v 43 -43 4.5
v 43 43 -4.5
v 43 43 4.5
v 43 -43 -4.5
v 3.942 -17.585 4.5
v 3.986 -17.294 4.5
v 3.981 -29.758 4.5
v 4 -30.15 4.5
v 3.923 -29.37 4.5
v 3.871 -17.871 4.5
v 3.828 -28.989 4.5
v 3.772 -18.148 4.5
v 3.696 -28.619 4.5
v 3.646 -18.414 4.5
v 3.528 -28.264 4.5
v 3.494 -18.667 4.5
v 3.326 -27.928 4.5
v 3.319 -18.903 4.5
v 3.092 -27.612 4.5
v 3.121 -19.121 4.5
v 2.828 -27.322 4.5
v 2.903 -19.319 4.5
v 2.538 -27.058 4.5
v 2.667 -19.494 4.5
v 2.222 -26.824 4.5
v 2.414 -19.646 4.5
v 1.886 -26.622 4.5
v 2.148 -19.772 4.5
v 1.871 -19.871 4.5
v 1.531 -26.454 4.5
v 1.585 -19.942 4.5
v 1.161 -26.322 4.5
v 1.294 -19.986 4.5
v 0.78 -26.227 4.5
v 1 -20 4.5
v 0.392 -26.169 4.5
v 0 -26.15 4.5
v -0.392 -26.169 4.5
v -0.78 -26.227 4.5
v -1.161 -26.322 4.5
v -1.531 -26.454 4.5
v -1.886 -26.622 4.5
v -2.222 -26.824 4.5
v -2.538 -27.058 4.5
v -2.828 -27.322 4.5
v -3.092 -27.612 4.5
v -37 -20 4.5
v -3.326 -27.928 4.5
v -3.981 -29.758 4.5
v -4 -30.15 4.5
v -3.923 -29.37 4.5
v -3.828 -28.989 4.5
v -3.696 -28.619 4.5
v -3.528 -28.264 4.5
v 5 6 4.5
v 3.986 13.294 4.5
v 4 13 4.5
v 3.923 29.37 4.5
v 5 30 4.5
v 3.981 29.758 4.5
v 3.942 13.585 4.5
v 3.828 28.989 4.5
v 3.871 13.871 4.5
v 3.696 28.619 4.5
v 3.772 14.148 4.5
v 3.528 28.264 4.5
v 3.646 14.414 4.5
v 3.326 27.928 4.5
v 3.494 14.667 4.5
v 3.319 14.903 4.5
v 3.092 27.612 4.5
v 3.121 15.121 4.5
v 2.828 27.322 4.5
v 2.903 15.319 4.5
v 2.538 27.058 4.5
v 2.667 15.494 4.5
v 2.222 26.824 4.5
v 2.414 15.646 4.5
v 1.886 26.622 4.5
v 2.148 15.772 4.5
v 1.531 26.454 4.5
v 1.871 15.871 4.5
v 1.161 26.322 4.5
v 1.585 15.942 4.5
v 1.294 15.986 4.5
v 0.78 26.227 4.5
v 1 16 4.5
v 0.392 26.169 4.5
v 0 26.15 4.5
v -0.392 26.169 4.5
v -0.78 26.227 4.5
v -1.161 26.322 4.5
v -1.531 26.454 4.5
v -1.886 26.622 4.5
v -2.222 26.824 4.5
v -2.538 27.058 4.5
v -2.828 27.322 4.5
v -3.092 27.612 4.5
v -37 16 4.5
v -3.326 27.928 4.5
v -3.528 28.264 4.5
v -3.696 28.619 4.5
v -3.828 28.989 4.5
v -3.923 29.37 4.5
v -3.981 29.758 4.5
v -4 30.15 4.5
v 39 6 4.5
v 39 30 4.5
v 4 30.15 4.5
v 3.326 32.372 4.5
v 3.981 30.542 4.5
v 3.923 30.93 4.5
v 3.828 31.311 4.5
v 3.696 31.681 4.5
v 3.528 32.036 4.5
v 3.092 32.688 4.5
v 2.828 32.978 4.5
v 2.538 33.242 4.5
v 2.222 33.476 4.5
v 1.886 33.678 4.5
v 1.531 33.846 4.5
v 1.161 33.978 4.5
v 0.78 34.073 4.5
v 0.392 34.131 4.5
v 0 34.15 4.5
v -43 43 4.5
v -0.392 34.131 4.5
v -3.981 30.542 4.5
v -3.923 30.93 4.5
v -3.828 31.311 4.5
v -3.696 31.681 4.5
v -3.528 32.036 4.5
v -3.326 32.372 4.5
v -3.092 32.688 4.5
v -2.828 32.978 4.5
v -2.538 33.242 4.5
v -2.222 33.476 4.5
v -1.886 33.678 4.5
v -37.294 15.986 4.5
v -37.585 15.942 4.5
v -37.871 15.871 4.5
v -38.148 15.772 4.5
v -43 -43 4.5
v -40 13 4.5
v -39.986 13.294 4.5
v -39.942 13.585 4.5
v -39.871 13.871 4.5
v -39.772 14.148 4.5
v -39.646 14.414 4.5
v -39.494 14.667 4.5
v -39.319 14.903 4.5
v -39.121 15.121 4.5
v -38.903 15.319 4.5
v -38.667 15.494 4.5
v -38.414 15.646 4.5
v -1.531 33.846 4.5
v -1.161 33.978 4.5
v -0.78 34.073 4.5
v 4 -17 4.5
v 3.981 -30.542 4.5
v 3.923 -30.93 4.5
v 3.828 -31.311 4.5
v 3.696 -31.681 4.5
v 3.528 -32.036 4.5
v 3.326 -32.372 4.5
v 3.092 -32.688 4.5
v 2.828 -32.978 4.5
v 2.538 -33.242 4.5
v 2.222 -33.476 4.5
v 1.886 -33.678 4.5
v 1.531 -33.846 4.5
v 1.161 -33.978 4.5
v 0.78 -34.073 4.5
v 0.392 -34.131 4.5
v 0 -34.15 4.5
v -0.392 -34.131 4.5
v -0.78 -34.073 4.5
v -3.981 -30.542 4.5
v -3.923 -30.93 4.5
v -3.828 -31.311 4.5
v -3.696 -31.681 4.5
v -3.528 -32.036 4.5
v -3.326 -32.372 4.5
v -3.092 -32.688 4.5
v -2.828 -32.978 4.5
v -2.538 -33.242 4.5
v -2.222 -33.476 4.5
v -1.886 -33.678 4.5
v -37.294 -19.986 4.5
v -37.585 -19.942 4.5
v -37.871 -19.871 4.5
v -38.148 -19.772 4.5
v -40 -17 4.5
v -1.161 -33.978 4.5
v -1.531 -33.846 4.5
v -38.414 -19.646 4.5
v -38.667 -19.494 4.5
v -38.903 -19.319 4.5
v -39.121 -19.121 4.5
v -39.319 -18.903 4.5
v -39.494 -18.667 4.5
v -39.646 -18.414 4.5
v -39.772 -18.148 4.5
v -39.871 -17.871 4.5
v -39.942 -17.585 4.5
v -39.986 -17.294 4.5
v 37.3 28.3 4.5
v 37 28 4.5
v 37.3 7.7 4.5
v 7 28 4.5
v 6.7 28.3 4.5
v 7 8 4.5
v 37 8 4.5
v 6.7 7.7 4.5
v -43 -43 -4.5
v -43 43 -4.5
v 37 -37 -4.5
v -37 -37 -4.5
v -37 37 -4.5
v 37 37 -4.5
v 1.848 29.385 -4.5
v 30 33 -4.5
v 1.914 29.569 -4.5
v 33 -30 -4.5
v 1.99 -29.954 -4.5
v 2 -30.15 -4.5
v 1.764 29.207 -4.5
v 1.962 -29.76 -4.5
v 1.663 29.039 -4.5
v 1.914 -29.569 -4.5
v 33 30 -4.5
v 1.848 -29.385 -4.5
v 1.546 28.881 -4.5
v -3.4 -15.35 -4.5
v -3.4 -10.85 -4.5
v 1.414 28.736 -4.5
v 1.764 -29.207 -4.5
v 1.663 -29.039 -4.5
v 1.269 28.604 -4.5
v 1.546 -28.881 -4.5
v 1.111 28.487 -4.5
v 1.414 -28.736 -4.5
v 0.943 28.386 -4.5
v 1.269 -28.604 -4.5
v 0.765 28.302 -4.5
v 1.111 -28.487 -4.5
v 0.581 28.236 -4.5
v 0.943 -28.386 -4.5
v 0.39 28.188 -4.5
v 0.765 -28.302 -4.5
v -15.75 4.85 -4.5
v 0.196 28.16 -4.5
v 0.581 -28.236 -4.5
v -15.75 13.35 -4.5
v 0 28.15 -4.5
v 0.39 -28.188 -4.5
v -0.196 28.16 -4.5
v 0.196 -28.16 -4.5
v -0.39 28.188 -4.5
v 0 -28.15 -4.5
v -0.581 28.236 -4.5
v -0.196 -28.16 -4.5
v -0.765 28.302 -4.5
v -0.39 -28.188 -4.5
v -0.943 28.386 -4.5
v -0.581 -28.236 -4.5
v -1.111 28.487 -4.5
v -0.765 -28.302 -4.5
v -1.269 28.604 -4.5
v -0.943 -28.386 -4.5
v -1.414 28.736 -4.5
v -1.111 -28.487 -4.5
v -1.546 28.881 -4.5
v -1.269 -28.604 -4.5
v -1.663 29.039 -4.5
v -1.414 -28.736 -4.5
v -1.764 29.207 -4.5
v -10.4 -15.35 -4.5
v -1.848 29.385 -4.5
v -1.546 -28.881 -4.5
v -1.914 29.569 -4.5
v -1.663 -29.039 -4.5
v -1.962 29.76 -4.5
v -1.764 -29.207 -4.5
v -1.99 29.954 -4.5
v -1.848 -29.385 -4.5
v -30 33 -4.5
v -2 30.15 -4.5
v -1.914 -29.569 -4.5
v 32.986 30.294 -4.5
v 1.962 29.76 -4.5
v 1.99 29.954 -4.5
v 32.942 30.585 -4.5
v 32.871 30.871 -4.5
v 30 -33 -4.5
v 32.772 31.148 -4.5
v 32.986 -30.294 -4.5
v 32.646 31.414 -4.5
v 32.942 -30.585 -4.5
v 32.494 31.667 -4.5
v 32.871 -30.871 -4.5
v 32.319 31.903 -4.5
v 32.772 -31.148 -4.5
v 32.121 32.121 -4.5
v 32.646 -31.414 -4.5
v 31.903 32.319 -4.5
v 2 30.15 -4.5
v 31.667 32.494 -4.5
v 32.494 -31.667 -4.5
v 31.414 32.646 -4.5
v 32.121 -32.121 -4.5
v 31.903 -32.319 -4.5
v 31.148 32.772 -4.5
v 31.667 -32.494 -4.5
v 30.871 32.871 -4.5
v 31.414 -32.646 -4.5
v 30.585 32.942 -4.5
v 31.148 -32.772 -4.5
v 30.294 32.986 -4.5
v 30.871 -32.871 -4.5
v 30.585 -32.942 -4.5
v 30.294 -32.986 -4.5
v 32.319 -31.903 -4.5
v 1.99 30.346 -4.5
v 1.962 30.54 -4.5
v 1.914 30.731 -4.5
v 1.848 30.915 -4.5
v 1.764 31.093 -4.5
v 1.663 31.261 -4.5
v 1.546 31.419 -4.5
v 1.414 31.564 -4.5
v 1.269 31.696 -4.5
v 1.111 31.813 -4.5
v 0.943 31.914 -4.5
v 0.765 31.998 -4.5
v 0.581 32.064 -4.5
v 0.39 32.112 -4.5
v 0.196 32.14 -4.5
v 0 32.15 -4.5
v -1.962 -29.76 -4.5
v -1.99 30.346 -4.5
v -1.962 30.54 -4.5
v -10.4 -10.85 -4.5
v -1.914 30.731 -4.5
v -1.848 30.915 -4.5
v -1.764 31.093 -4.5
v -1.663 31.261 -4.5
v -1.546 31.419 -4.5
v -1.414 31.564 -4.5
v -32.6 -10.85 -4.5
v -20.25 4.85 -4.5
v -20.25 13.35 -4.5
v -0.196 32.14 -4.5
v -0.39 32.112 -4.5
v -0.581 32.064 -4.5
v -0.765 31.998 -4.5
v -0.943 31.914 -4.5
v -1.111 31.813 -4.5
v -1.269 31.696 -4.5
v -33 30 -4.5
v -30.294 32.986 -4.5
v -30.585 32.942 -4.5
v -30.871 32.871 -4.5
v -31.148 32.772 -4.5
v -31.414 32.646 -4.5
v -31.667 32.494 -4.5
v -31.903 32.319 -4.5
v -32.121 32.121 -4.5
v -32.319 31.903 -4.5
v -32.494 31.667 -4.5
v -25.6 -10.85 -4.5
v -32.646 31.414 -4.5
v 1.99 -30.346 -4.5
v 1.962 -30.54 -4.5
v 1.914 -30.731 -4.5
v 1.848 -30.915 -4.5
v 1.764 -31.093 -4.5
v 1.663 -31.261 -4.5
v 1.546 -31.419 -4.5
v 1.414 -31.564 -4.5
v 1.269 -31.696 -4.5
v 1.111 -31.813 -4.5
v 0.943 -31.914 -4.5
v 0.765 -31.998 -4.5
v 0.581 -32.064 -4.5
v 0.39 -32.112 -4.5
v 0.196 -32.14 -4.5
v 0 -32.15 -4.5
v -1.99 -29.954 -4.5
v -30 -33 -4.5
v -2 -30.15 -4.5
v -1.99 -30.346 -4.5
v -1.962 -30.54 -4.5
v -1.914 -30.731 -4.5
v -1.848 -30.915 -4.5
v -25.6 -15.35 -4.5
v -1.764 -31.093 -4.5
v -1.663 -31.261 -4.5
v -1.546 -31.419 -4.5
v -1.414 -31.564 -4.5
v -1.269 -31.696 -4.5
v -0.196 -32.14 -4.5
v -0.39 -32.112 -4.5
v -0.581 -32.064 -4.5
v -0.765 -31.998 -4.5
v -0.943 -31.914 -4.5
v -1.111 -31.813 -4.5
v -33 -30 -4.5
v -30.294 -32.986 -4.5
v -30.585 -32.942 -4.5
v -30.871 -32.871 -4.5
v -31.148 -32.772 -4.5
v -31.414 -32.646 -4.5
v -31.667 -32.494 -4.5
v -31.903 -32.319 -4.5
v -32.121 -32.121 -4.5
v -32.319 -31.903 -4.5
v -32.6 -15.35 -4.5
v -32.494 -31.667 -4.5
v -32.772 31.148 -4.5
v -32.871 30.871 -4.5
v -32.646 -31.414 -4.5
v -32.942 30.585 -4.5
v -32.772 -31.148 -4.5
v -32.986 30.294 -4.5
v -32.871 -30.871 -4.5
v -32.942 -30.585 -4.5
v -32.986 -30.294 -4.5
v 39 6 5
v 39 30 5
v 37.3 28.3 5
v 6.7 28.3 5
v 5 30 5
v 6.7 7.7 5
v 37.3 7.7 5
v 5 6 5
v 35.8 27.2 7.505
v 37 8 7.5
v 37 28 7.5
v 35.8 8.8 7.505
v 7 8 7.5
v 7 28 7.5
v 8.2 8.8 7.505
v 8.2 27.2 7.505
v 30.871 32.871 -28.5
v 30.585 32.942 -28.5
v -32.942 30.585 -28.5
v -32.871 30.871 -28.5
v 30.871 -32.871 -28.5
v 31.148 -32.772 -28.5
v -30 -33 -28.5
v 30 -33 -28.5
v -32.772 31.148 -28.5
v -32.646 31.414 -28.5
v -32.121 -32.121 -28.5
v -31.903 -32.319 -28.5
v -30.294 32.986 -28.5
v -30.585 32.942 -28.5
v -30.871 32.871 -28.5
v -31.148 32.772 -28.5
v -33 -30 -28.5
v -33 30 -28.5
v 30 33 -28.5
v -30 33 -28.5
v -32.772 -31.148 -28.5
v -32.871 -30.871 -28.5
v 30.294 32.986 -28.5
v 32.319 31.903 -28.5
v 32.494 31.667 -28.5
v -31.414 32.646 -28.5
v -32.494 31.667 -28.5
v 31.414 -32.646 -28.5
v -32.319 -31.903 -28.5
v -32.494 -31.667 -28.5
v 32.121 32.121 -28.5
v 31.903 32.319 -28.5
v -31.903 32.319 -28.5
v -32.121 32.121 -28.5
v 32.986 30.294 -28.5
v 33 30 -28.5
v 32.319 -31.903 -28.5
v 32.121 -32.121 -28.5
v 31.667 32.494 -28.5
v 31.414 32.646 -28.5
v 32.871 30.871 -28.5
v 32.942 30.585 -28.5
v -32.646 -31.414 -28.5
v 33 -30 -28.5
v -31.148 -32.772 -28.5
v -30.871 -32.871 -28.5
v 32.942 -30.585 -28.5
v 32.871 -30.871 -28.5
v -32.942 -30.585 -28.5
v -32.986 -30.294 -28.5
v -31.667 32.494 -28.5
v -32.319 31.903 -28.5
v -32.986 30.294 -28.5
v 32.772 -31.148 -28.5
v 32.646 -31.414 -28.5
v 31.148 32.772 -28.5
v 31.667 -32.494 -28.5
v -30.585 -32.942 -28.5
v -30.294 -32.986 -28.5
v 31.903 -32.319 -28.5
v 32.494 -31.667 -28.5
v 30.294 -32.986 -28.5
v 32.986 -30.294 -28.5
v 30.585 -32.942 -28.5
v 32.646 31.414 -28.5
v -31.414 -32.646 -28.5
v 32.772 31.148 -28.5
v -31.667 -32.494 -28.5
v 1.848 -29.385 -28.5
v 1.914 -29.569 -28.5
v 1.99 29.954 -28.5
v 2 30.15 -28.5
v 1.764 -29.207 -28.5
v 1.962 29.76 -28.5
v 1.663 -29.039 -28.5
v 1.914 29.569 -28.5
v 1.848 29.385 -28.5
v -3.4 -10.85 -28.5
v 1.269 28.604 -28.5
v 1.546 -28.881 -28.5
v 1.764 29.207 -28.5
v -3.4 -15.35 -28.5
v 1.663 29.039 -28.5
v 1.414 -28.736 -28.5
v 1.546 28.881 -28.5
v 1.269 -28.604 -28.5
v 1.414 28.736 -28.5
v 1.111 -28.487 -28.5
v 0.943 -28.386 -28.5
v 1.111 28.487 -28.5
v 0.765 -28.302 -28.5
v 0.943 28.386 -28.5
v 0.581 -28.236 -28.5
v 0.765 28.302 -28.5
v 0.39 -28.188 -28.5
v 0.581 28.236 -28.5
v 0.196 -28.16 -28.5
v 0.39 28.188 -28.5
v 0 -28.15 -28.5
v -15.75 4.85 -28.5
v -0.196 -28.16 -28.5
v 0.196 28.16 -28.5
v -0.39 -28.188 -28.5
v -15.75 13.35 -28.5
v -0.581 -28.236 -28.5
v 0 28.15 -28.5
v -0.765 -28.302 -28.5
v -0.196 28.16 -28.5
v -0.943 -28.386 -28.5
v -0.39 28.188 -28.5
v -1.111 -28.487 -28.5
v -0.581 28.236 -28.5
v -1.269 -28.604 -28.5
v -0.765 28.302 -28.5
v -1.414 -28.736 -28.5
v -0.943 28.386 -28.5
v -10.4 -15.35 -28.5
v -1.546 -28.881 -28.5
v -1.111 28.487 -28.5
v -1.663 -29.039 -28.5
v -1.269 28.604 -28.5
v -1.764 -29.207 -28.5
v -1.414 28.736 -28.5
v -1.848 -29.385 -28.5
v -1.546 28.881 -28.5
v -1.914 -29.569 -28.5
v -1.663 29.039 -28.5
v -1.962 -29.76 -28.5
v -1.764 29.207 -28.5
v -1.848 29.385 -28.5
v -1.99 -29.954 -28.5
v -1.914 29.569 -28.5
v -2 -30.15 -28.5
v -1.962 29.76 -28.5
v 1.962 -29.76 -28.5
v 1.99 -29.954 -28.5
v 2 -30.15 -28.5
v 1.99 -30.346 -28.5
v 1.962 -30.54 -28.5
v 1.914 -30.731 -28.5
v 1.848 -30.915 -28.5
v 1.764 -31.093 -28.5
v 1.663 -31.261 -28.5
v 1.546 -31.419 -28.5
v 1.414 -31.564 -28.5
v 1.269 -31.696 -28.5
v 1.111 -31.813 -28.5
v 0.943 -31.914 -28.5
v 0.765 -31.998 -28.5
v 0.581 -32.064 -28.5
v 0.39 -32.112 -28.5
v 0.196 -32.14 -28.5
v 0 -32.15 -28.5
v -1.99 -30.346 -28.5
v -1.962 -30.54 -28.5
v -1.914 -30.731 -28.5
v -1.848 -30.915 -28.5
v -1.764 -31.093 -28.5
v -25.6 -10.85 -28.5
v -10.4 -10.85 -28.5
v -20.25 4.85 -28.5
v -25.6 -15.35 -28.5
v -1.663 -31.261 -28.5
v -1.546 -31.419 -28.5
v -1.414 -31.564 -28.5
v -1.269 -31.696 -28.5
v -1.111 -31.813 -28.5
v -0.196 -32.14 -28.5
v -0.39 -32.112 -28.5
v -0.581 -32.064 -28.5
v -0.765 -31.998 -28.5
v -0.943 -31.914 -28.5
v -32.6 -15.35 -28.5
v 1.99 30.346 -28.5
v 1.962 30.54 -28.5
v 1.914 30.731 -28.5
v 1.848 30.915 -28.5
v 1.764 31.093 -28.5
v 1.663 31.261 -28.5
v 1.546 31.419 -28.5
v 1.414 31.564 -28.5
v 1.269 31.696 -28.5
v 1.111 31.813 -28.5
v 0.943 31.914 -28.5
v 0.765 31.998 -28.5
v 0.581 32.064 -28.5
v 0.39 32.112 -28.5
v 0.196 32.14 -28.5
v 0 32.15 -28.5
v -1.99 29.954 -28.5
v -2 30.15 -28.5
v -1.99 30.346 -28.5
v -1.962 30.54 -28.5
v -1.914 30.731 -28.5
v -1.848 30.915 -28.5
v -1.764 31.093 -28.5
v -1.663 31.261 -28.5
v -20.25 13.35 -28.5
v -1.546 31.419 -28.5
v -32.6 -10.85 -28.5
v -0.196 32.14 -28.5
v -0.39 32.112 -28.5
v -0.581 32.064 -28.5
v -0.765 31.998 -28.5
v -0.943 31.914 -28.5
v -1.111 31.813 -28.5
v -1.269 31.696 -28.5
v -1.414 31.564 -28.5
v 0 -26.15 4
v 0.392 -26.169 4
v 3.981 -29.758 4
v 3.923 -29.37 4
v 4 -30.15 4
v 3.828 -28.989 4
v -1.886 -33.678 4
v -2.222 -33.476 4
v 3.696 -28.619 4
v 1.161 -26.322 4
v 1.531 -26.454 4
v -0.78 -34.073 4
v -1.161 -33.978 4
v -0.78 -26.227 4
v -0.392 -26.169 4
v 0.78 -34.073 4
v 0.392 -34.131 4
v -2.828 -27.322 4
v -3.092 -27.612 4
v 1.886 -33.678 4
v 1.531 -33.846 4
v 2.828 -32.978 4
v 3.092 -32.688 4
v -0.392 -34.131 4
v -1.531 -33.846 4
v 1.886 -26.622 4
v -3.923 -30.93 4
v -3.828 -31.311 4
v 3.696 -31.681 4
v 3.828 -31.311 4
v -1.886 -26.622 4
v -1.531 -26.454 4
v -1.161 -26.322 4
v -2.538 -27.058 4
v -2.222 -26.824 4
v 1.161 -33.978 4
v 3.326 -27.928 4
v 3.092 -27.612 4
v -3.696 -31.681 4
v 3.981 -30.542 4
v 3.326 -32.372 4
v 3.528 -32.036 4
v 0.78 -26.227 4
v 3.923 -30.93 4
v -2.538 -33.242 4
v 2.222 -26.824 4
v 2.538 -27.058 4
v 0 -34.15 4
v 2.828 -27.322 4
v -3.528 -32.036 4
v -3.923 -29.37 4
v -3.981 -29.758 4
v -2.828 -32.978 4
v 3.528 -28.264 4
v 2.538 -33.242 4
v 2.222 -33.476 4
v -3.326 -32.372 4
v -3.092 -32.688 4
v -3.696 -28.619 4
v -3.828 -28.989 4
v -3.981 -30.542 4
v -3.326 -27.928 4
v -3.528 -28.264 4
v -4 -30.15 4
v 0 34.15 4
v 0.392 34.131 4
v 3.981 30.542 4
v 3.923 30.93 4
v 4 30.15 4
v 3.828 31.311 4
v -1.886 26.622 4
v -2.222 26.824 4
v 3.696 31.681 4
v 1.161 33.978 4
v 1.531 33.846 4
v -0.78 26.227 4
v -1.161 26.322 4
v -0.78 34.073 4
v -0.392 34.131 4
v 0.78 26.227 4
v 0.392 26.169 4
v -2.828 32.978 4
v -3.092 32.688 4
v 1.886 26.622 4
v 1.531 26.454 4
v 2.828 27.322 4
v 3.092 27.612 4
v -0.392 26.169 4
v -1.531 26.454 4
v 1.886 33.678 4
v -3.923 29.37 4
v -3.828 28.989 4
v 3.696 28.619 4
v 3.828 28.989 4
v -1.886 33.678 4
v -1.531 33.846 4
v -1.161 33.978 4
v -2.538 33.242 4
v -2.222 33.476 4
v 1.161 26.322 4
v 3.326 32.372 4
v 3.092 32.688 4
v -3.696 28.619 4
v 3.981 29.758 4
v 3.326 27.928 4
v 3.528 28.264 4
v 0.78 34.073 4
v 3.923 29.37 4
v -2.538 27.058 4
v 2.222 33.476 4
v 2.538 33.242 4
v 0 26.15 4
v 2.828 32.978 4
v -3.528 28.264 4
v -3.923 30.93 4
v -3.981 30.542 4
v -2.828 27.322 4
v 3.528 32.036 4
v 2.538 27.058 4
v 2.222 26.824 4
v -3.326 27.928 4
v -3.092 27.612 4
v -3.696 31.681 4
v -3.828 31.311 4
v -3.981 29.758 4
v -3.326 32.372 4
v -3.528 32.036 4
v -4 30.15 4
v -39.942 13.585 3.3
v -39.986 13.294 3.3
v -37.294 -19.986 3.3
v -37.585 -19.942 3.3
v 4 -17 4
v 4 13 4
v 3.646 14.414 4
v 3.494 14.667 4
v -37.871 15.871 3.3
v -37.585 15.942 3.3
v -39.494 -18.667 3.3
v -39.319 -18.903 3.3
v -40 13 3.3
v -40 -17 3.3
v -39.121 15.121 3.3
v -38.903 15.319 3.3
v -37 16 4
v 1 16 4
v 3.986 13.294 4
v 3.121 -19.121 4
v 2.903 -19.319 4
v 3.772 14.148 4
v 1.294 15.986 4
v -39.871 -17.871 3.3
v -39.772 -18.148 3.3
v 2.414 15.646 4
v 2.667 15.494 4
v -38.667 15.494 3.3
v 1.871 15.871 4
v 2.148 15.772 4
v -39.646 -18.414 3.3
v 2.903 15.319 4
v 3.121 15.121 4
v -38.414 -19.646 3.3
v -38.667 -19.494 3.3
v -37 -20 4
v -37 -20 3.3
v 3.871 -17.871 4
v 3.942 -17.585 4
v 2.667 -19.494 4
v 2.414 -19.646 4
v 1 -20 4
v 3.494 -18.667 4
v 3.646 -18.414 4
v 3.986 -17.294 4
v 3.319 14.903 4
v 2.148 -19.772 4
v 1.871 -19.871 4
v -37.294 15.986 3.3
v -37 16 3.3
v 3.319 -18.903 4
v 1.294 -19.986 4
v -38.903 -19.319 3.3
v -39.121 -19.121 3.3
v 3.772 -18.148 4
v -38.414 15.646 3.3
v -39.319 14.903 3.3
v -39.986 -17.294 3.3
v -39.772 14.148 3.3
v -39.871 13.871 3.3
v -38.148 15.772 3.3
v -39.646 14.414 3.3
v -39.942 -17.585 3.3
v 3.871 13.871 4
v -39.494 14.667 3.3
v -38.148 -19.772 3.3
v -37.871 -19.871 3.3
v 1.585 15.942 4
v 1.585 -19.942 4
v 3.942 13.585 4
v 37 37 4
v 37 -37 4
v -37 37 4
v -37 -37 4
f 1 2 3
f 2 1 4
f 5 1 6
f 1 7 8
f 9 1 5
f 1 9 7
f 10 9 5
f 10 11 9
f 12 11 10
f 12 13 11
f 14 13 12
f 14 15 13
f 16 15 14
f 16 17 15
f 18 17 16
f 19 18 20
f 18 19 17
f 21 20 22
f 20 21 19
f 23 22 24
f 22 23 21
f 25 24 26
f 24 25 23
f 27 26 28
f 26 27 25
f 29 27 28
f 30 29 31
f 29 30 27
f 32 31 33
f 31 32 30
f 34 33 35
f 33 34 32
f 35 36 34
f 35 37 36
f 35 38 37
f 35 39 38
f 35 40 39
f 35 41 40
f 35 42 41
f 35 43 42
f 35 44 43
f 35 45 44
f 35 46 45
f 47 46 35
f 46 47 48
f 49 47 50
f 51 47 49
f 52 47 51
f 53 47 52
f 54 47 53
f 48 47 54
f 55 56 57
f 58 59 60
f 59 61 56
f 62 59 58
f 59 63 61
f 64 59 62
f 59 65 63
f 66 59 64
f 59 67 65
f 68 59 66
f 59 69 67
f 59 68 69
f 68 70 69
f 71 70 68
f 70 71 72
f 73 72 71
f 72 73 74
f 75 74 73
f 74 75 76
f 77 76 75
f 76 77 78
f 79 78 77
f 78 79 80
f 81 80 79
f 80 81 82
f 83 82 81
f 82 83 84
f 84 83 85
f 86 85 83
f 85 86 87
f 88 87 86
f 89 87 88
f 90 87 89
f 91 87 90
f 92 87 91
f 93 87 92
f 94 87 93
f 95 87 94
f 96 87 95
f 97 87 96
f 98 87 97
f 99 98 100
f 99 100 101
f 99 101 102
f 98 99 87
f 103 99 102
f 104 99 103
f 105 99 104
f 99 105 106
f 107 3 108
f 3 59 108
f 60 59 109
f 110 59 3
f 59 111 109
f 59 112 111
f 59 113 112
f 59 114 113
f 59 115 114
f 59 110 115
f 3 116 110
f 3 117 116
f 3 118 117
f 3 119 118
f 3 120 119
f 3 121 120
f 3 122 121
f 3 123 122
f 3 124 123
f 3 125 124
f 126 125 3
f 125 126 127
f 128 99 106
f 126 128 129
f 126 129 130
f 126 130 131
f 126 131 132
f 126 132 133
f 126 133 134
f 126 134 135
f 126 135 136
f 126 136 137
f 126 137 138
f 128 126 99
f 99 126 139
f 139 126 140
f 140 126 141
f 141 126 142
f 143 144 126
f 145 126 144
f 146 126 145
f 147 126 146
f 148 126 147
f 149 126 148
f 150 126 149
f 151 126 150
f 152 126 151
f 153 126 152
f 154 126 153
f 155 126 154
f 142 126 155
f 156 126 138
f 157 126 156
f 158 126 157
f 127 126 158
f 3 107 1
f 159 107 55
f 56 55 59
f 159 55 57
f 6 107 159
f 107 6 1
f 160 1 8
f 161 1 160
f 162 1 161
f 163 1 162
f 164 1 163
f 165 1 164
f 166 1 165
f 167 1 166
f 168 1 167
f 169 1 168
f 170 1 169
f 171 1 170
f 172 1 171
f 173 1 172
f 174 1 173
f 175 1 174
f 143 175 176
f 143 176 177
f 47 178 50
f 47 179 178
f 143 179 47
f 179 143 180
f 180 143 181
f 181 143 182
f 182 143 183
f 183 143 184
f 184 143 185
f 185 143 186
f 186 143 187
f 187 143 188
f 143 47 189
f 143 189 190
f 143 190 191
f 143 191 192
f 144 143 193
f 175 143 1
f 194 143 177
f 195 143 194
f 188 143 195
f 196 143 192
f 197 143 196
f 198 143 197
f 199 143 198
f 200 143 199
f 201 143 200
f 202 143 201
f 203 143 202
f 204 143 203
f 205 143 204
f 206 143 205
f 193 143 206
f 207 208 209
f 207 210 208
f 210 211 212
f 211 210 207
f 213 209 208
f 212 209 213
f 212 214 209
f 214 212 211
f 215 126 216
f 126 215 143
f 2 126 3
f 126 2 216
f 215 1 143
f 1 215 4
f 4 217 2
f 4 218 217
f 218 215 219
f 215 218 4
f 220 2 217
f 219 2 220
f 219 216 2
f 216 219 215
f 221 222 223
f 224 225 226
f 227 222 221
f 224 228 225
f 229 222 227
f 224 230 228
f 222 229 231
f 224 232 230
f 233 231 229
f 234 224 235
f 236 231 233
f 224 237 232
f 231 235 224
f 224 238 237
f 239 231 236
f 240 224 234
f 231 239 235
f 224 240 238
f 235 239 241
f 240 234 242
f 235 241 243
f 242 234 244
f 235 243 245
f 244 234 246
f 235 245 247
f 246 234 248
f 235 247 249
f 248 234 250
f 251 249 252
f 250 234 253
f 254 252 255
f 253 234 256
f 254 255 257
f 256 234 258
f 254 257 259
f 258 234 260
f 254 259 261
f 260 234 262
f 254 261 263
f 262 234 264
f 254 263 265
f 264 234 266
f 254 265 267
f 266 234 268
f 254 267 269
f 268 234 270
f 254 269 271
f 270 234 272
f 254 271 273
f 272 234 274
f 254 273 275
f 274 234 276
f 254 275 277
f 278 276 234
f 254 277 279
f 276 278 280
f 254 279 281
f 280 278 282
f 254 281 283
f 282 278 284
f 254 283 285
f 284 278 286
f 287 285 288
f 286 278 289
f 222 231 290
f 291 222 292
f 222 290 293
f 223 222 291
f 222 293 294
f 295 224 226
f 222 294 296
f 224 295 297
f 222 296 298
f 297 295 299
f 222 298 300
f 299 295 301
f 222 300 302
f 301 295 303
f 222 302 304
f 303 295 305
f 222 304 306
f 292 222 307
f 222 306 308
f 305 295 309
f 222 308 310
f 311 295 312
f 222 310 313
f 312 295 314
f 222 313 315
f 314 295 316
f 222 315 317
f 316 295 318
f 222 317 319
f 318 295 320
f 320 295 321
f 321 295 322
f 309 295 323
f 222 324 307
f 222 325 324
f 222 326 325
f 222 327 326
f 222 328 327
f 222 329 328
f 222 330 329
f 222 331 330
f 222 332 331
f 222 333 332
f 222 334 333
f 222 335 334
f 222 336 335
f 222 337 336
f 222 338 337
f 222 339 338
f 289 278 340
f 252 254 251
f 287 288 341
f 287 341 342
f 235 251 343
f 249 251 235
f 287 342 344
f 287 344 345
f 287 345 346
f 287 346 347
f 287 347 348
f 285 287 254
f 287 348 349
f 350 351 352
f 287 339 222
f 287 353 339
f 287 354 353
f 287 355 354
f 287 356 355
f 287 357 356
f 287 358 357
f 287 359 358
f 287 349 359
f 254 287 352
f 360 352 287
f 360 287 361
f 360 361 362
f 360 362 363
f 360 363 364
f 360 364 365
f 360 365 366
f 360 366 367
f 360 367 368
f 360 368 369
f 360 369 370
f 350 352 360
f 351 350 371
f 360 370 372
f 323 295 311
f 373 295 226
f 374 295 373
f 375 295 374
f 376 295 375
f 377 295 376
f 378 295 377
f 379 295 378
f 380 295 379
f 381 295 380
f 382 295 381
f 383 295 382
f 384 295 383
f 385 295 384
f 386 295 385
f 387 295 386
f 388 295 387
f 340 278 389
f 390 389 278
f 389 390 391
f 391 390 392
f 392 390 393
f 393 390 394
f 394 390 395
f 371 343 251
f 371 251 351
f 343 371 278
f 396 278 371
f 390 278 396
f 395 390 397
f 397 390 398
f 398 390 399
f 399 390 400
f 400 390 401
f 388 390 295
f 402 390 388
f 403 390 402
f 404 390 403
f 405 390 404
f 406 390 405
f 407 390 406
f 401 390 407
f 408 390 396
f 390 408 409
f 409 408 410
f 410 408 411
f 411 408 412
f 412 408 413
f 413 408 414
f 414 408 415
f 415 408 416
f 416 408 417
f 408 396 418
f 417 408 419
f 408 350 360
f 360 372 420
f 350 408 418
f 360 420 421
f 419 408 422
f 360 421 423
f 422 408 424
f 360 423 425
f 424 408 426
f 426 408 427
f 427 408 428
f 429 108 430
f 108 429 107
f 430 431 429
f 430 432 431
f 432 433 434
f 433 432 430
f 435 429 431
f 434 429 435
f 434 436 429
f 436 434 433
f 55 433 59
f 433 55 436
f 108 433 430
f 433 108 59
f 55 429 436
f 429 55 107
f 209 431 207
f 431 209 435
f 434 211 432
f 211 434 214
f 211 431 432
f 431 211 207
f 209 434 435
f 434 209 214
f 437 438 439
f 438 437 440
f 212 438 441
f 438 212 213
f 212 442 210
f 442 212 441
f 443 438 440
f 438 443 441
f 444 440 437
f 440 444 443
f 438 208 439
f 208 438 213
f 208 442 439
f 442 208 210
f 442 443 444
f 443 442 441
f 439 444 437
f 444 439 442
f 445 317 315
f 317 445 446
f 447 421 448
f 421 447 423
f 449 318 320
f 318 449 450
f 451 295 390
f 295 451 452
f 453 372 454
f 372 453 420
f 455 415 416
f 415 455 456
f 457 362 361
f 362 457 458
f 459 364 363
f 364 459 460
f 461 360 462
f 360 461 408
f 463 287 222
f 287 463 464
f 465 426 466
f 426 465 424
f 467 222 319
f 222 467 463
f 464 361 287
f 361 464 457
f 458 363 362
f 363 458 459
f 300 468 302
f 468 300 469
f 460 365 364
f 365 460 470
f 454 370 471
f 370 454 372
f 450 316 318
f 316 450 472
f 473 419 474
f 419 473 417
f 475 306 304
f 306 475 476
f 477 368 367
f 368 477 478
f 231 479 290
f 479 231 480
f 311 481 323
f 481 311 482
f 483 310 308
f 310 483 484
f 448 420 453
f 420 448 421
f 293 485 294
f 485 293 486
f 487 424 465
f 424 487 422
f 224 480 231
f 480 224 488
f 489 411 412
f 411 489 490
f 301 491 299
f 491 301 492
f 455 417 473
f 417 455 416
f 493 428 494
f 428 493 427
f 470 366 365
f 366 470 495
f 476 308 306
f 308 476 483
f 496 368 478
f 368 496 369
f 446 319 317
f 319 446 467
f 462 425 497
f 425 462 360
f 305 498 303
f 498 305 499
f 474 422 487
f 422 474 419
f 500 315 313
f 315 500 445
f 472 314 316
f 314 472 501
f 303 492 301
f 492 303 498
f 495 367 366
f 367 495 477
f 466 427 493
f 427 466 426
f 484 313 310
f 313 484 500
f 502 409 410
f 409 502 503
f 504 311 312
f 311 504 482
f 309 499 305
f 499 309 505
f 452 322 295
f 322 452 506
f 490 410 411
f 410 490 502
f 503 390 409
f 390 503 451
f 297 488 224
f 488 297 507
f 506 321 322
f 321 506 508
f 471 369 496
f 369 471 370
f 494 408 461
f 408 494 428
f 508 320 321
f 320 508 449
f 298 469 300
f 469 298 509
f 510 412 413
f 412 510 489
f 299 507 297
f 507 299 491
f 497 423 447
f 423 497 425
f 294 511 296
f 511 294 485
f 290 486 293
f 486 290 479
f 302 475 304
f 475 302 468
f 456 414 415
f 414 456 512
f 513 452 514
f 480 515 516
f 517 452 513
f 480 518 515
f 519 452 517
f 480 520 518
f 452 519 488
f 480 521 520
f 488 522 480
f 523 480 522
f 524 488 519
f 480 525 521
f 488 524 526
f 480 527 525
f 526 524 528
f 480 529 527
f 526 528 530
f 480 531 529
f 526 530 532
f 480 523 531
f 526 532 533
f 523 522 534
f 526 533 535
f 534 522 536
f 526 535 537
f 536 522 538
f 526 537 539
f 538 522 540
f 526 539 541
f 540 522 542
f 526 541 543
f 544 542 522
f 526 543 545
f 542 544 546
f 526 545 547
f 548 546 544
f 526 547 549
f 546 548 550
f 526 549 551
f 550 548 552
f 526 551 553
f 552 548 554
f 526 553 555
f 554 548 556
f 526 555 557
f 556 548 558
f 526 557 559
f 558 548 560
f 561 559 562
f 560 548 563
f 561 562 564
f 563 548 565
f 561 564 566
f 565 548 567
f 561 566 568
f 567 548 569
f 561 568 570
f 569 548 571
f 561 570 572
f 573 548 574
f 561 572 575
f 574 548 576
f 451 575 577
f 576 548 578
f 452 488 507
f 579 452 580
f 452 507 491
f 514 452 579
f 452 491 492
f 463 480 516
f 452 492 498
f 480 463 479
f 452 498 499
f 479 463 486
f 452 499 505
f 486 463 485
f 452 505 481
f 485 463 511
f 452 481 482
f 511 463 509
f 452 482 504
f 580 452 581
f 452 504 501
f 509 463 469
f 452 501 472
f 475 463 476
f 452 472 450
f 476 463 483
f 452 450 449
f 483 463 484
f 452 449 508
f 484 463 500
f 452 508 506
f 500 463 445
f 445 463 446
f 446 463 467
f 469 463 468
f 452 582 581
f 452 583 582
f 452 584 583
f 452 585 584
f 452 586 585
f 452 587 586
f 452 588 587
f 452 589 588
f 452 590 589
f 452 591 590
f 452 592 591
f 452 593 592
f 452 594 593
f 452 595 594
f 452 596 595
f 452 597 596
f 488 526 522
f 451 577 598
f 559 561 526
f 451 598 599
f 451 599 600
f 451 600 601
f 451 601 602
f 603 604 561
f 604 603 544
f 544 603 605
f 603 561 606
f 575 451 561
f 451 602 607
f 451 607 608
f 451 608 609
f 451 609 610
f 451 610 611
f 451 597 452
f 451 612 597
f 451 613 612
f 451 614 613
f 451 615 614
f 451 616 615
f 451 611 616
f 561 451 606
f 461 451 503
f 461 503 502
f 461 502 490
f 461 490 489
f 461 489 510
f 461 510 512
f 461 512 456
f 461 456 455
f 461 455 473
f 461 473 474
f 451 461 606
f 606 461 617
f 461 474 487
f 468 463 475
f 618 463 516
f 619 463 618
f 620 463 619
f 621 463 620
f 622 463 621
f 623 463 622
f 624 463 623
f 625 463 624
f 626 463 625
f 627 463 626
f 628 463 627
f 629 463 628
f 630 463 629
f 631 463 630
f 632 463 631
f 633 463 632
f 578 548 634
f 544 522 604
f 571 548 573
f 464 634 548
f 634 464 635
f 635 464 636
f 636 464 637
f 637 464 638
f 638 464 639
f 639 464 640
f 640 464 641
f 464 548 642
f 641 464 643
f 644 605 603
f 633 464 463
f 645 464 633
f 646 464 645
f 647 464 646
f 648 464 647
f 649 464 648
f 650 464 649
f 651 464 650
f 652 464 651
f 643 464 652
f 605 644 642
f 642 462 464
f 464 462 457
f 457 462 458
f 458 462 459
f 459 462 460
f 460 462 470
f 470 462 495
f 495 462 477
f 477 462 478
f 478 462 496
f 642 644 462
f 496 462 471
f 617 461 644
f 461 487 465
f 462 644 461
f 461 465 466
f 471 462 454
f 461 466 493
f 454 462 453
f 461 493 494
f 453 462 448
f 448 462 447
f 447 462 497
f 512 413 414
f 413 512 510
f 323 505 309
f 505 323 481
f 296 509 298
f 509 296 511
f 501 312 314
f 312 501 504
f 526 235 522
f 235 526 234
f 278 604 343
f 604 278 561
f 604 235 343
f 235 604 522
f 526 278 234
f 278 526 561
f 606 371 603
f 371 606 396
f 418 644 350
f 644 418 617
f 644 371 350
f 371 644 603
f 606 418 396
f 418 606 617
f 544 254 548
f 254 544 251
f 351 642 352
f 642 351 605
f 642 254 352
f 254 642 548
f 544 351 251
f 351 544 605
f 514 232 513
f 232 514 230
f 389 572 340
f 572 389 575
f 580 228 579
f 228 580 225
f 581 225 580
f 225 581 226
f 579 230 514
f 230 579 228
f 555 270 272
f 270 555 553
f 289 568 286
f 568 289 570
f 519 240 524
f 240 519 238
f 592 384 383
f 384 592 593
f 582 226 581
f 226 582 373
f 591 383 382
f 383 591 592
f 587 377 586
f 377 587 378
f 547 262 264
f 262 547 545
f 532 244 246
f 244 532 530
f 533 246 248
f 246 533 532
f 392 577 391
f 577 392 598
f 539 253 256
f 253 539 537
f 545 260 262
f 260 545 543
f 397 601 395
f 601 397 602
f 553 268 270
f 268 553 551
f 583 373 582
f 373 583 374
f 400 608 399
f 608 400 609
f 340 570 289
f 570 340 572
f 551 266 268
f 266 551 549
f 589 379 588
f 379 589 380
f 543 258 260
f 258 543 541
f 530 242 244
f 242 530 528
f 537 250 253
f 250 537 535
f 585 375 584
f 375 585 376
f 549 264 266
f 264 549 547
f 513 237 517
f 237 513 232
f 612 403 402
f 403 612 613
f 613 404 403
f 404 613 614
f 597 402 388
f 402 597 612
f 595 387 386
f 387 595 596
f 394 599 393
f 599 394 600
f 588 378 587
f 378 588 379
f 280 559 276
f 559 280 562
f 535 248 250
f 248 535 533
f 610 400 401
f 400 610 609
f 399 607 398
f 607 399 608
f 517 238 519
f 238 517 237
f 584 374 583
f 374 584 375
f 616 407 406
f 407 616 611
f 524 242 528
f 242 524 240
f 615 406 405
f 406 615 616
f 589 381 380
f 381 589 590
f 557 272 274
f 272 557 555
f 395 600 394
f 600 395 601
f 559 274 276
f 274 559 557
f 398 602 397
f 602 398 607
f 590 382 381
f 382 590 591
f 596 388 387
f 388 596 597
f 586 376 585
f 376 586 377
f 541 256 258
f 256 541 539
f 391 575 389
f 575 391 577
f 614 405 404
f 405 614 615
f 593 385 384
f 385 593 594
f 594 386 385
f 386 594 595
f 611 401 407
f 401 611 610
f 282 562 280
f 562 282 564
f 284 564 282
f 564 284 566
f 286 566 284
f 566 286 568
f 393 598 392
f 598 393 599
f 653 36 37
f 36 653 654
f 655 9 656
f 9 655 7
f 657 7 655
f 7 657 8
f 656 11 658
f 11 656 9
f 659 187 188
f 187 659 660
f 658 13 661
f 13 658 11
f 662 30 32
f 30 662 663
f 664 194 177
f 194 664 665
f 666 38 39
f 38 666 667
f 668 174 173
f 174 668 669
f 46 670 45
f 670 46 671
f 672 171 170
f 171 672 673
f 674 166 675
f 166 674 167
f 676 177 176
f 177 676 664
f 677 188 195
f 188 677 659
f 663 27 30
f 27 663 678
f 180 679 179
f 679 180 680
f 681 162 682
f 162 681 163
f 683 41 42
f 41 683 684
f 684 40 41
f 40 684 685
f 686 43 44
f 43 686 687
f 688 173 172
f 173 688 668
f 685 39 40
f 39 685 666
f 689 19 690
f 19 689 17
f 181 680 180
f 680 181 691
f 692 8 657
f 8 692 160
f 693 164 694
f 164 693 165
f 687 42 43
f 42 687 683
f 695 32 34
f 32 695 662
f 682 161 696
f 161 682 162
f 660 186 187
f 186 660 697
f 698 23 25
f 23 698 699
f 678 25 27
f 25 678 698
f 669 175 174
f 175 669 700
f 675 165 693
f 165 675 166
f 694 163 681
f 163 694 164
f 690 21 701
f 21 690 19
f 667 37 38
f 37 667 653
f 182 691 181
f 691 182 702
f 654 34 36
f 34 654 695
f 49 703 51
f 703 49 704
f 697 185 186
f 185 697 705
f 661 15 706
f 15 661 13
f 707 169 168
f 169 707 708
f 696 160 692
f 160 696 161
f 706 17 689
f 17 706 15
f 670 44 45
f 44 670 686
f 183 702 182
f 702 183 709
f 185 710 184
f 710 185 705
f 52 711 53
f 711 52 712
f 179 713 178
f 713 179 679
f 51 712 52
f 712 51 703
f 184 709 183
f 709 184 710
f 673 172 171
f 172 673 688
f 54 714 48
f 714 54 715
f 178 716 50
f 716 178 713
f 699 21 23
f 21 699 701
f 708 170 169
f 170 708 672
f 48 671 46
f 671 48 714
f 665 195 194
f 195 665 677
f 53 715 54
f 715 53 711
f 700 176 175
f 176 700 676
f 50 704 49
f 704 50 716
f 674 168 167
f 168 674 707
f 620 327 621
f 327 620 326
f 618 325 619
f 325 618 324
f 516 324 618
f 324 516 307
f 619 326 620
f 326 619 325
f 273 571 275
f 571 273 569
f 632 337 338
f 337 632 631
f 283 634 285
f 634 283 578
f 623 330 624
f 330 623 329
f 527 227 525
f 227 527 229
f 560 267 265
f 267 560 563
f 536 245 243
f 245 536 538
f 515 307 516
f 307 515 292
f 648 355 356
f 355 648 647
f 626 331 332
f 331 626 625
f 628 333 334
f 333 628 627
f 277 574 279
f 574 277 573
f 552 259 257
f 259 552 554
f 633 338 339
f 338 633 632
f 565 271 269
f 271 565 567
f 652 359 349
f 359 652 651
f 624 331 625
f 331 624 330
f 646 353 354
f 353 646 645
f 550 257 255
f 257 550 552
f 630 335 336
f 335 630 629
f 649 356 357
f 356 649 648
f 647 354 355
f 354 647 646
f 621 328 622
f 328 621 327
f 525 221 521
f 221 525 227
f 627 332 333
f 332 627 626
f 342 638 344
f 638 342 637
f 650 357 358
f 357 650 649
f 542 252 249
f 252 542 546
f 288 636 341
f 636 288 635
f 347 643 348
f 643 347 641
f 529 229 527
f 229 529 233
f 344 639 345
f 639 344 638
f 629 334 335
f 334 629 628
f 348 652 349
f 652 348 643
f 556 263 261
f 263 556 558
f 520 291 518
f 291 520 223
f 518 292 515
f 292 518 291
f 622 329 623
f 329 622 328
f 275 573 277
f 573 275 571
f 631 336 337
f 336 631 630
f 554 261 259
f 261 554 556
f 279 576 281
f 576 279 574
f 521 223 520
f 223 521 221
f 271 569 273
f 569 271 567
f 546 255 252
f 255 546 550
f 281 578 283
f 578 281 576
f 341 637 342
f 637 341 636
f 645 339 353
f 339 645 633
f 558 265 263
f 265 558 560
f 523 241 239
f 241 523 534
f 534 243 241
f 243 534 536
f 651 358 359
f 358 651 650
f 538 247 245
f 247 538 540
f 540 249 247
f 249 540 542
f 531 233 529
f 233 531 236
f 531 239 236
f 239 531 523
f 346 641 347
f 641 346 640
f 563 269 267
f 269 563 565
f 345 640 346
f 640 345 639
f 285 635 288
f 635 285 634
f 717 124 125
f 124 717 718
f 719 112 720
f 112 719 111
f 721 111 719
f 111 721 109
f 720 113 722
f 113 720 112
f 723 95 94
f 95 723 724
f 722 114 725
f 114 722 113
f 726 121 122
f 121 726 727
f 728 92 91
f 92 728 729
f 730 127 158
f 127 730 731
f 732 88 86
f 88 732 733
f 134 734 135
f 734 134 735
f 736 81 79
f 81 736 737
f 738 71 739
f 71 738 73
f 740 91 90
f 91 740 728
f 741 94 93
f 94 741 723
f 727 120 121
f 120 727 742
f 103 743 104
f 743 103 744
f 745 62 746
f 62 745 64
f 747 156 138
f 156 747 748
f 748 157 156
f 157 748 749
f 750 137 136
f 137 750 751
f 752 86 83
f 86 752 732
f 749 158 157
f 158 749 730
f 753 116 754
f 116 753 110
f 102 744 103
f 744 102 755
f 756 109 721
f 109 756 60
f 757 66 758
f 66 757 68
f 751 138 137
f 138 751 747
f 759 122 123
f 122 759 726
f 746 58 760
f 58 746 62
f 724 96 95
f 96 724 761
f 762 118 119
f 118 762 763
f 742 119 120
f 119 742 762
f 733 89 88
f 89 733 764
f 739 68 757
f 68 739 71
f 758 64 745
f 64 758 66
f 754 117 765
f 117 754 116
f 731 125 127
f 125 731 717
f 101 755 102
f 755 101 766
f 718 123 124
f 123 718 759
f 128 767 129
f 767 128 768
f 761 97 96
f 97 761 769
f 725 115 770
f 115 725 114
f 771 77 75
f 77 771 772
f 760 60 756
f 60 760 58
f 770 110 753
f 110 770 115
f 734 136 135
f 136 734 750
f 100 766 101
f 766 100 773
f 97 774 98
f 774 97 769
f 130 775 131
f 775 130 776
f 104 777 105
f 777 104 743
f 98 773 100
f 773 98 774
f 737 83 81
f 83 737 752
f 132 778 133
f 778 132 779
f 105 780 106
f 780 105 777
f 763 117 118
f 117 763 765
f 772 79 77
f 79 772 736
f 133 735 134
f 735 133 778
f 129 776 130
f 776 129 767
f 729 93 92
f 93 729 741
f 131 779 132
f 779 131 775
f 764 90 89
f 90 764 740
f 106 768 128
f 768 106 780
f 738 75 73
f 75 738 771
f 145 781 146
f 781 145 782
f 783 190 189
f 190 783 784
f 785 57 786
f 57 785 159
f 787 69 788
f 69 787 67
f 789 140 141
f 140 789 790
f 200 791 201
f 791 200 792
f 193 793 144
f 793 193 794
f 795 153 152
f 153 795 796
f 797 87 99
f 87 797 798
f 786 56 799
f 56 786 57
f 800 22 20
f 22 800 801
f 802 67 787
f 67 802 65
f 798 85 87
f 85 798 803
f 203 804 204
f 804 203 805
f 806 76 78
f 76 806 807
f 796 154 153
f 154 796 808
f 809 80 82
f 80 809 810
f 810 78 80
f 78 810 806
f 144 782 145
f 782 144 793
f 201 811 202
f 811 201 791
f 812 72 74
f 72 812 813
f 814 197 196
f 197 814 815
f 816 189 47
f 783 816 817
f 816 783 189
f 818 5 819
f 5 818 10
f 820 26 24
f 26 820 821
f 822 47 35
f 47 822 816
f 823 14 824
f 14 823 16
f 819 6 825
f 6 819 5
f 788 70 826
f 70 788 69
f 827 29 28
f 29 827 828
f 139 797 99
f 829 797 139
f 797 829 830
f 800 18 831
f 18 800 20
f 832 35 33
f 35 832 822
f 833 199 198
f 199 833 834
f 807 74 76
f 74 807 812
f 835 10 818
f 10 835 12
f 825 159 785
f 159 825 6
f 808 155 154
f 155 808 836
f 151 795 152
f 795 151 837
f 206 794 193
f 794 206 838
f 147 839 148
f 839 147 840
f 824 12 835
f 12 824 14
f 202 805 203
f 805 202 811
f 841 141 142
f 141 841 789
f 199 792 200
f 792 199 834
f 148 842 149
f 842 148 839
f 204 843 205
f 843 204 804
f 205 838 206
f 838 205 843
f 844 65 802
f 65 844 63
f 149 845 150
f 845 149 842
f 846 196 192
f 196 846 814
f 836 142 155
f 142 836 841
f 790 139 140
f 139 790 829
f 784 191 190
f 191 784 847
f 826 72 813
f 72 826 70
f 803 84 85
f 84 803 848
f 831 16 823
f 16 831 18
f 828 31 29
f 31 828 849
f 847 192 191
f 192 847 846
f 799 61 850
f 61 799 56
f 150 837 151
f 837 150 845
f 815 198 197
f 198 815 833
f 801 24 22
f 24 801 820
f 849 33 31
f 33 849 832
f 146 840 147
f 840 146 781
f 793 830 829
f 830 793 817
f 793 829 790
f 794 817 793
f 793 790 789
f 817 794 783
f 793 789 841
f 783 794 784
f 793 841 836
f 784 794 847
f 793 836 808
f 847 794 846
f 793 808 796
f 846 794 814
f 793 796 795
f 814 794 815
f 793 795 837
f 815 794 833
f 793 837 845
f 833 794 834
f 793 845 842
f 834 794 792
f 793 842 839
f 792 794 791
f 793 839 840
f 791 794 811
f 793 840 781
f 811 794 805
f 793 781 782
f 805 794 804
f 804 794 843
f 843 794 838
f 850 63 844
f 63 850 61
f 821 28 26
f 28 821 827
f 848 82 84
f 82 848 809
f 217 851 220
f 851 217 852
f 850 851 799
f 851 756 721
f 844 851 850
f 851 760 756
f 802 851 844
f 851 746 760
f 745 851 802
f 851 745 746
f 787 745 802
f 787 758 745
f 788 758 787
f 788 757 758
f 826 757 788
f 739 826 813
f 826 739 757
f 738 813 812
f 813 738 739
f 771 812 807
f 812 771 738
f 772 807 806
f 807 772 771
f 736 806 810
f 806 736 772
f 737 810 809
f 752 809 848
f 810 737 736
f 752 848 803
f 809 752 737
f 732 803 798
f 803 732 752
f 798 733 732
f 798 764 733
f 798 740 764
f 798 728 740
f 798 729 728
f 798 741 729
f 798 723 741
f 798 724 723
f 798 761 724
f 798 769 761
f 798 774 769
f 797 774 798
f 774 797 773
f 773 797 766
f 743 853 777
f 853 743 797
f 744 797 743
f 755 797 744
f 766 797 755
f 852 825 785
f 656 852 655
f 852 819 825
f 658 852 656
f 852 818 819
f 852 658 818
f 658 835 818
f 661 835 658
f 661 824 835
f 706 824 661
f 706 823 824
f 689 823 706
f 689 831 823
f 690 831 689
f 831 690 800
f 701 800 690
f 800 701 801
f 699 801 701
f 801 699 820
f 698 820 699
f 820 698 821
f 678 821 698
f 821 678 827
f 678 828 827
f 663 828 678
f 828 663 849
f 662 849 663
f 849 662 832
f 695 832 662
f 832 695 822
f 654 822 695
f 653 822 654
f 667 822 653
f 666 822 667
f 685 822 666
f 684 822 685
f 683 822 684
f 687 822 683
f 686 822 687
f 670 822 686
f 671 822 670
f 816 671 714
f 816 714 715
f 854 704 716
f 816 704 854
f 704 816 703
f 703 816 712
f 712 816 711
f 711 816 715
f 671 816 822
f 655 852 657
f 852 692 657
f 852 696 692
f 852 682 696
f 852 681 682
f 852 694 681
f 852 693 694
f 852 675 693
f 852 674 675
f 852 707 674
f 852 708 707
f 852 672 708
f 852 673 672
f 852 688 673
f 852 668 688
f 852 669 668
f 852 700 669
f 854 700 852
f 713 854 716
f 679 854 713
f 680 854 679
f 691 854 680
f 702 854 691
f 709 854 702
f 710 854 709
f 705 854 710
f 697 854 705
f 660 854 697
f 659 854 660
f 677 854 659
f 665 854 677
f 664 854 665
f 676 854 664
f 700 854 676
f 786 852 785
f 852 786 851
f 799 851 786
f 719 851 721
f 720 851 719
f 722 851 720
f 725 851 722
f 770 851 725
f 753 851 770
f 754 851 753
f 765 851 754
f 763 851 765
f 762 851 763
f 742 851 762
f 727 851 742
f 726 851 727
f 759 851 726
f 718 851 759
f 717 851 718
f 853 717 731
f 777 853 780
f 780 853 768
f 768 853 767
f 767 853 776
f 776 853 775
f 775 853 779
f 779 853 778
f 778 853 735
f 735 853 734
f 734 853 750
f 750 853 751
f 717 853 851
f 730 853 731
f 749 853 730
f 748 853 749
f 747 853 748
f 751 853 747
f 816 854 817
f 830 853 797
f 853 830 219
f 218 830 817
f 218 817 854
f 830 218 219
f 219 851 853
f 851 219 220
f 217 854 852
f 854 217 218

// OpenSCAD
// UK mains socket (Screwfix-style), switched - single connected solid
// Parameters
plate_width_mm = 86; //[70:120]
plate_height_mm = 86; //[70:120]
overall_depth_mm = 9; //[6:18]
front_lip_thickness_mm = 2.5; //[1.5:5]
rear_cavity_margin_mm = 6; //[3:12]
rear_cavity_depth_mm = 6.5; //[3:14]
mount_hole_pitch_mm = 60.3; //[50:80]
mount_screw_clear_diameter_mm = 4.0; //[3.0:6.0]
counterbore_diameter_mm = 8.0; //[6.0:12.0]
counterbore_depth_mm = 2.5; //[1.0:5.0]

// Socket aperture geometry (UK)
pin_live_neutral_center_x_mm = 11.1; //[9:14]
pin_live_neutral_center_y_mm = -11.1; //[-14:-8]
pin_live_neutral_size_x_mm = 7.0; //[5.0:10.0]
pin_live_neutral_size_y_mm = 4.5; //[3.0:7.0]
pin_earth_center_y_mm = 11.1; //[8:14]
pin_earth_size_x_mm = 4.5; //[3.0:7.0]
pin_earth_size_y_mm = 8.5; //[6.0:12.0]
aperture_cut_depth_mm = 30; //[6:40]  // ensure fully through plate + rear housing

// Switch placement and features
switch_offset_x_mm = 22; //[10:30]
switch_offset_y_mm = 18; //[10:30]
switch_feature_width_mm = 28; //[18:45]
switch_feature_height_mm = 18; //[12:30]
switch_feature_depth_mm = 1.5; //[0.5:4]
connect_overlap_mm = 1; //[0.5:2]

// Rear housing + rocker details
rear_housing_depth_mm = 25; //[10:45]
rear_housing_margin_mm = 10; //[6:18]
rear_housing_corner_r_mm = 3; //[0:8]
terminal_boss_w_mm = 14; //[8:22]
terminal_boss_h_mm = 10; //[6:18]
terminal_boss_depth_mm = 8; //[4:16]
terminal_boss_offset_y_mm = -18; //[-30:-5]
terminal_boss_offset_x_mm = 18; //[10:30]

switch_rocker_w_mm = 30; //[18:45]
switch_rocker_h_mm = 20; //[12:35]
switch_rocker_thickness_mm = 4; //[2:8]
switch_bezel_margin_mm = 2; //[1:5]
switch_bezel_depth_mm = 1.2; //[0.5:3]
switch_gap_mm = 0.6; //[0.2:1.2]

// Added: socket front recess + shutter cues (visual recognizability)
socket_center_x_mm = -18; // place socket on left, switch on right
socket_center_y_mm = -2;
socket_recess_w_mm = 44; //[34:55]
socket_recess_h_mm = 36; //[28:48]
socket_recess_depth_mm = 1.2; //[0.6:2.5]
socket_recess_corner_r_mm = 3; //[0:6]

shutter_slot_w_mm = 2.2; //[1.2:3.5]
shutter_slot_h_mm = 6.0; //[4:10]
shutter_slot_offset_y_mm = 2.0; //[0:5]
shutter_slot_depth_mm = 0.8; //[0.3:1.5]

$fn = 64;

module rounded_box(size=[10,10,10], r=2, center=true) {
  sx = size[0]; sy = size[1]; sz = size[2];
  rr = min(r, sx/2, sy/2);
  translate(center ? [0,0,0] : [sx/2, sy/2, sz/2])
    hull() {
      for (ix = [-1, 1], iy = [-1, 1])
        translate([ix*(sx/2-rr), iy*(sy/2-rr), 0])
          cylinder(r=rr, h=sz, center=true);
    }
}

module faceplate_solid() {
  union() {
    // Main plate
    cube([plate_width_mm, plate_height_mm, overall_depth_mm], center=true);

    // Front lip frame (thin raised border)
    lip_w = plate_width_mm - 2*front_lip_thickness_mm;
    lip_h = plate_height_mm - 2*front_lip_thickness_mm;
    lip_t = front_lip_thickness_mm;

    translate([0,0, overall_depth_mm/2 - lip_t/2])
      difference() {
        cube([plate_width_mm, plate_height_mm, lip_t], center=true);
        cube([lip_w, lip_h, lip_t + 2*connect_overlap_mm], center=true);
      }
  }
}

module rear_housing_solid() {
  housing_w = plate_width_mm - 2*rear_housing_margin_mm;
  housing_h = plate_height_mm - 2*rear_housing_margin_mm;

  translate([0, 0, -overall_depth_mm/2 - rear_housing_depth_mm/2 + connect_overlap_mm])
    rounded_box([housing_w, housing_h, rear_housing_depth_mm], r=rear_housing_corner_r_mm, center=true);
}

module switch_bezel_and_rocker_solid() {
  bezel_w = switch_rocker_w_mm + 2*switch_bezel_margin_mm;
  bezel_h = switch_rocker_h_mm + 2*switch_bezel_margin_mm;

  bezel_zc = overall_depth_mm/2 - switch_bezel_depth_mm/2;
  rocker_zc = overall_depth_mm/2 + switch_rocker_thickness_mm/2 - connect_overlap_mm;

  translate([switch_offset_x_mm, switch_offset_y_mm, 0]) {
    // Bezel frame
    translate([0,0,bezel_zc])
      difference() {
        cube([bezel_w, bezel_h, switch_bezel_depth_mm + connect_overlap_mm], center=true);
        cube([switch_rocker_w_mm + switch_gap_mm, switch_rocker_h_mm + switch_gap_mm,
              switch_bezel_depth_mm + 2*connect_overlap_mm], center=true);
      }

    // Rocker (raised)
    translate([0,0,rocker_zc])
      hull() {
        cube([switch_rocker_w_mm, switch_rocker_h_mm, switch_rocker_thickness_mm], center=true);
        translate([0,0, switch_rocker_thickness_mm/2])
          cube([switch_rocker_w_mm*0.92, switch_rocker_h_mm*0.92, 0.01], center=true);
      }
  }
}

module terminal_bosses_solid() {
  boss_zc = -overall_depth_mm/2 - terminal_boss_depth_mm/2 + connect_overlap_mm;

  for (sx = [-1, 1]) {
    translate([sx*terminal_boss_offset_x_mm, terminal_boss_offset_y_mm, boss_zc])
      rounded_box([terminal_boss_w_mm, terminal_boss_h_mm, terminal_boss_depth_mm], r=2, center=true);
  }
}

module socket_front_recess_cut() {
  // Recessed area around apertures (recognizable socket front)
  recess_zc = overall_depth_mm/2 - socket_recess_depth_mm/2 + connect_overlap_mm/2;
  translate([socket_center_x_mm, socket_center_y_mm, recess_zc])
    rounded_box([socket_recess_w_mm, socket_recess_h_mm, socket_recess_depth_mm + connect_overlap_mm],
                r=socket_recess_corner_r_mm, center=true);
}

module pin_apertures_cut() {
  // Through cuts for UK socket apertures (L, N, E)
  // Ensure cuts go through plate and into rear housing
  cut_h = overall_depth_mm + rear_housing_depth_mm + 6*connect_overlap_mm;
  cut_zc = -rear_housing_depth_mm/2; // centered so it spans both plate and housing

  translate([socket_center_x_mm, socket_center_y_mm, 0]) {
    translate([ pin_live_neutral_center_x_mm, pin_live_neutral_center_y_mm, cut_zc])
      cube([pin_live_neutral_size_x_mm, pin_live_neutral_size_y_mm, cut_h], center=true);
    translate([-pin_live_neutral_center_x_mm, pin_live_neutral_center_y_mm, cut_zc])
      cube([pin_live_neutral_size_x_mm, pin_live_neutral_size_y_mm, cut_h], center=true);
    translate([0, pin_earth_center_y_mm, cut_zc])
      cube([pin_earth_size_x_mm, pin_earth_size_y_mm, cut_h], center=true);
  }
}

module shutter_cues_cut() {
  // Small shallow slots above L/N to suggest shutter mechanism (visual cue only)
  slot_zc = overall_depth_mm/2 - shutter_slot_depth_mm/2 + connect_overlap_mm/2;

  translate([socket_center_x_mm, socket_center_y_mm, 0]) {
    for (sx = [-1, 1]) {
      translate([sx*pin_live_neutral_center_x_mm, pin_live_neutral_center_y_mm + shutter_slot_offset_y_mm, slot_zc])
        cube([shutter_slot_w_mm, shutter_slot_h_mm, shutter_slot_depth_mm + connect_overlap_mm], center=true);
    }
  }
}

module mounting_holes_cut() {
  // Through holes + counterbores from front
  through_h = overall_depth_mm + rear_housing_depth_mm + 6*connect_overlap_mm;

  for (sy = [-1, 1]) {
    translate([0, sy*mount_hole_pitch_mm/2, -rear_housing_depth_mm/2])
      cylinder(r=mount_screw_clear_diameter_mm/2, h=through_h, center=true);

    translate([0, sy*mount_hole_pitch_mm/2, overall_depth_mm/2 - counterbore_depth_mm/2])
      cylinder(r=counterbore_diameter_mm/2, h=counterbore_depth_mm + 2*connect_overlap_mm, center=true);
  }
}

module rear_cavity_cut() {
  // Hollow cavity behind faceplate (leave front skin)
  cavity_w = plate_width_mm - 2*rear_cavity_margin_mm;
  cavity_h = plate_height_mm - 2*rear_cavity_margin_mm;

  cavity_depth = min(rear_cavity_depth_mm, max(0.1, overall_depth_mm - front_lip_thickness_mm));
  cavity_zc = -overall_depth_mm/2 + cavity_depth/2 + connect_overlap_mm;

  translate([0, 0, cavity_zc])
    cube([cavity_w, cavity_h, cavity_depth + 2*connect_overlap_mm], center=true);
}

module assembly() {
  color([0.85, 0.85, 0.8])
  difference() {
    union() {
      faceplate_solid();
      rear_housing_solid();
      switch_bezel_and_rocker_solid();
      terminal_bosses_solid();
    }
    union() {
      socket_front_recess_cut();
      pin_apertures_cut();
      shutter_cues_cut();
      mounting_holes_cut();
      rear_cavity_cut();
    }
  }
}

assembly();
